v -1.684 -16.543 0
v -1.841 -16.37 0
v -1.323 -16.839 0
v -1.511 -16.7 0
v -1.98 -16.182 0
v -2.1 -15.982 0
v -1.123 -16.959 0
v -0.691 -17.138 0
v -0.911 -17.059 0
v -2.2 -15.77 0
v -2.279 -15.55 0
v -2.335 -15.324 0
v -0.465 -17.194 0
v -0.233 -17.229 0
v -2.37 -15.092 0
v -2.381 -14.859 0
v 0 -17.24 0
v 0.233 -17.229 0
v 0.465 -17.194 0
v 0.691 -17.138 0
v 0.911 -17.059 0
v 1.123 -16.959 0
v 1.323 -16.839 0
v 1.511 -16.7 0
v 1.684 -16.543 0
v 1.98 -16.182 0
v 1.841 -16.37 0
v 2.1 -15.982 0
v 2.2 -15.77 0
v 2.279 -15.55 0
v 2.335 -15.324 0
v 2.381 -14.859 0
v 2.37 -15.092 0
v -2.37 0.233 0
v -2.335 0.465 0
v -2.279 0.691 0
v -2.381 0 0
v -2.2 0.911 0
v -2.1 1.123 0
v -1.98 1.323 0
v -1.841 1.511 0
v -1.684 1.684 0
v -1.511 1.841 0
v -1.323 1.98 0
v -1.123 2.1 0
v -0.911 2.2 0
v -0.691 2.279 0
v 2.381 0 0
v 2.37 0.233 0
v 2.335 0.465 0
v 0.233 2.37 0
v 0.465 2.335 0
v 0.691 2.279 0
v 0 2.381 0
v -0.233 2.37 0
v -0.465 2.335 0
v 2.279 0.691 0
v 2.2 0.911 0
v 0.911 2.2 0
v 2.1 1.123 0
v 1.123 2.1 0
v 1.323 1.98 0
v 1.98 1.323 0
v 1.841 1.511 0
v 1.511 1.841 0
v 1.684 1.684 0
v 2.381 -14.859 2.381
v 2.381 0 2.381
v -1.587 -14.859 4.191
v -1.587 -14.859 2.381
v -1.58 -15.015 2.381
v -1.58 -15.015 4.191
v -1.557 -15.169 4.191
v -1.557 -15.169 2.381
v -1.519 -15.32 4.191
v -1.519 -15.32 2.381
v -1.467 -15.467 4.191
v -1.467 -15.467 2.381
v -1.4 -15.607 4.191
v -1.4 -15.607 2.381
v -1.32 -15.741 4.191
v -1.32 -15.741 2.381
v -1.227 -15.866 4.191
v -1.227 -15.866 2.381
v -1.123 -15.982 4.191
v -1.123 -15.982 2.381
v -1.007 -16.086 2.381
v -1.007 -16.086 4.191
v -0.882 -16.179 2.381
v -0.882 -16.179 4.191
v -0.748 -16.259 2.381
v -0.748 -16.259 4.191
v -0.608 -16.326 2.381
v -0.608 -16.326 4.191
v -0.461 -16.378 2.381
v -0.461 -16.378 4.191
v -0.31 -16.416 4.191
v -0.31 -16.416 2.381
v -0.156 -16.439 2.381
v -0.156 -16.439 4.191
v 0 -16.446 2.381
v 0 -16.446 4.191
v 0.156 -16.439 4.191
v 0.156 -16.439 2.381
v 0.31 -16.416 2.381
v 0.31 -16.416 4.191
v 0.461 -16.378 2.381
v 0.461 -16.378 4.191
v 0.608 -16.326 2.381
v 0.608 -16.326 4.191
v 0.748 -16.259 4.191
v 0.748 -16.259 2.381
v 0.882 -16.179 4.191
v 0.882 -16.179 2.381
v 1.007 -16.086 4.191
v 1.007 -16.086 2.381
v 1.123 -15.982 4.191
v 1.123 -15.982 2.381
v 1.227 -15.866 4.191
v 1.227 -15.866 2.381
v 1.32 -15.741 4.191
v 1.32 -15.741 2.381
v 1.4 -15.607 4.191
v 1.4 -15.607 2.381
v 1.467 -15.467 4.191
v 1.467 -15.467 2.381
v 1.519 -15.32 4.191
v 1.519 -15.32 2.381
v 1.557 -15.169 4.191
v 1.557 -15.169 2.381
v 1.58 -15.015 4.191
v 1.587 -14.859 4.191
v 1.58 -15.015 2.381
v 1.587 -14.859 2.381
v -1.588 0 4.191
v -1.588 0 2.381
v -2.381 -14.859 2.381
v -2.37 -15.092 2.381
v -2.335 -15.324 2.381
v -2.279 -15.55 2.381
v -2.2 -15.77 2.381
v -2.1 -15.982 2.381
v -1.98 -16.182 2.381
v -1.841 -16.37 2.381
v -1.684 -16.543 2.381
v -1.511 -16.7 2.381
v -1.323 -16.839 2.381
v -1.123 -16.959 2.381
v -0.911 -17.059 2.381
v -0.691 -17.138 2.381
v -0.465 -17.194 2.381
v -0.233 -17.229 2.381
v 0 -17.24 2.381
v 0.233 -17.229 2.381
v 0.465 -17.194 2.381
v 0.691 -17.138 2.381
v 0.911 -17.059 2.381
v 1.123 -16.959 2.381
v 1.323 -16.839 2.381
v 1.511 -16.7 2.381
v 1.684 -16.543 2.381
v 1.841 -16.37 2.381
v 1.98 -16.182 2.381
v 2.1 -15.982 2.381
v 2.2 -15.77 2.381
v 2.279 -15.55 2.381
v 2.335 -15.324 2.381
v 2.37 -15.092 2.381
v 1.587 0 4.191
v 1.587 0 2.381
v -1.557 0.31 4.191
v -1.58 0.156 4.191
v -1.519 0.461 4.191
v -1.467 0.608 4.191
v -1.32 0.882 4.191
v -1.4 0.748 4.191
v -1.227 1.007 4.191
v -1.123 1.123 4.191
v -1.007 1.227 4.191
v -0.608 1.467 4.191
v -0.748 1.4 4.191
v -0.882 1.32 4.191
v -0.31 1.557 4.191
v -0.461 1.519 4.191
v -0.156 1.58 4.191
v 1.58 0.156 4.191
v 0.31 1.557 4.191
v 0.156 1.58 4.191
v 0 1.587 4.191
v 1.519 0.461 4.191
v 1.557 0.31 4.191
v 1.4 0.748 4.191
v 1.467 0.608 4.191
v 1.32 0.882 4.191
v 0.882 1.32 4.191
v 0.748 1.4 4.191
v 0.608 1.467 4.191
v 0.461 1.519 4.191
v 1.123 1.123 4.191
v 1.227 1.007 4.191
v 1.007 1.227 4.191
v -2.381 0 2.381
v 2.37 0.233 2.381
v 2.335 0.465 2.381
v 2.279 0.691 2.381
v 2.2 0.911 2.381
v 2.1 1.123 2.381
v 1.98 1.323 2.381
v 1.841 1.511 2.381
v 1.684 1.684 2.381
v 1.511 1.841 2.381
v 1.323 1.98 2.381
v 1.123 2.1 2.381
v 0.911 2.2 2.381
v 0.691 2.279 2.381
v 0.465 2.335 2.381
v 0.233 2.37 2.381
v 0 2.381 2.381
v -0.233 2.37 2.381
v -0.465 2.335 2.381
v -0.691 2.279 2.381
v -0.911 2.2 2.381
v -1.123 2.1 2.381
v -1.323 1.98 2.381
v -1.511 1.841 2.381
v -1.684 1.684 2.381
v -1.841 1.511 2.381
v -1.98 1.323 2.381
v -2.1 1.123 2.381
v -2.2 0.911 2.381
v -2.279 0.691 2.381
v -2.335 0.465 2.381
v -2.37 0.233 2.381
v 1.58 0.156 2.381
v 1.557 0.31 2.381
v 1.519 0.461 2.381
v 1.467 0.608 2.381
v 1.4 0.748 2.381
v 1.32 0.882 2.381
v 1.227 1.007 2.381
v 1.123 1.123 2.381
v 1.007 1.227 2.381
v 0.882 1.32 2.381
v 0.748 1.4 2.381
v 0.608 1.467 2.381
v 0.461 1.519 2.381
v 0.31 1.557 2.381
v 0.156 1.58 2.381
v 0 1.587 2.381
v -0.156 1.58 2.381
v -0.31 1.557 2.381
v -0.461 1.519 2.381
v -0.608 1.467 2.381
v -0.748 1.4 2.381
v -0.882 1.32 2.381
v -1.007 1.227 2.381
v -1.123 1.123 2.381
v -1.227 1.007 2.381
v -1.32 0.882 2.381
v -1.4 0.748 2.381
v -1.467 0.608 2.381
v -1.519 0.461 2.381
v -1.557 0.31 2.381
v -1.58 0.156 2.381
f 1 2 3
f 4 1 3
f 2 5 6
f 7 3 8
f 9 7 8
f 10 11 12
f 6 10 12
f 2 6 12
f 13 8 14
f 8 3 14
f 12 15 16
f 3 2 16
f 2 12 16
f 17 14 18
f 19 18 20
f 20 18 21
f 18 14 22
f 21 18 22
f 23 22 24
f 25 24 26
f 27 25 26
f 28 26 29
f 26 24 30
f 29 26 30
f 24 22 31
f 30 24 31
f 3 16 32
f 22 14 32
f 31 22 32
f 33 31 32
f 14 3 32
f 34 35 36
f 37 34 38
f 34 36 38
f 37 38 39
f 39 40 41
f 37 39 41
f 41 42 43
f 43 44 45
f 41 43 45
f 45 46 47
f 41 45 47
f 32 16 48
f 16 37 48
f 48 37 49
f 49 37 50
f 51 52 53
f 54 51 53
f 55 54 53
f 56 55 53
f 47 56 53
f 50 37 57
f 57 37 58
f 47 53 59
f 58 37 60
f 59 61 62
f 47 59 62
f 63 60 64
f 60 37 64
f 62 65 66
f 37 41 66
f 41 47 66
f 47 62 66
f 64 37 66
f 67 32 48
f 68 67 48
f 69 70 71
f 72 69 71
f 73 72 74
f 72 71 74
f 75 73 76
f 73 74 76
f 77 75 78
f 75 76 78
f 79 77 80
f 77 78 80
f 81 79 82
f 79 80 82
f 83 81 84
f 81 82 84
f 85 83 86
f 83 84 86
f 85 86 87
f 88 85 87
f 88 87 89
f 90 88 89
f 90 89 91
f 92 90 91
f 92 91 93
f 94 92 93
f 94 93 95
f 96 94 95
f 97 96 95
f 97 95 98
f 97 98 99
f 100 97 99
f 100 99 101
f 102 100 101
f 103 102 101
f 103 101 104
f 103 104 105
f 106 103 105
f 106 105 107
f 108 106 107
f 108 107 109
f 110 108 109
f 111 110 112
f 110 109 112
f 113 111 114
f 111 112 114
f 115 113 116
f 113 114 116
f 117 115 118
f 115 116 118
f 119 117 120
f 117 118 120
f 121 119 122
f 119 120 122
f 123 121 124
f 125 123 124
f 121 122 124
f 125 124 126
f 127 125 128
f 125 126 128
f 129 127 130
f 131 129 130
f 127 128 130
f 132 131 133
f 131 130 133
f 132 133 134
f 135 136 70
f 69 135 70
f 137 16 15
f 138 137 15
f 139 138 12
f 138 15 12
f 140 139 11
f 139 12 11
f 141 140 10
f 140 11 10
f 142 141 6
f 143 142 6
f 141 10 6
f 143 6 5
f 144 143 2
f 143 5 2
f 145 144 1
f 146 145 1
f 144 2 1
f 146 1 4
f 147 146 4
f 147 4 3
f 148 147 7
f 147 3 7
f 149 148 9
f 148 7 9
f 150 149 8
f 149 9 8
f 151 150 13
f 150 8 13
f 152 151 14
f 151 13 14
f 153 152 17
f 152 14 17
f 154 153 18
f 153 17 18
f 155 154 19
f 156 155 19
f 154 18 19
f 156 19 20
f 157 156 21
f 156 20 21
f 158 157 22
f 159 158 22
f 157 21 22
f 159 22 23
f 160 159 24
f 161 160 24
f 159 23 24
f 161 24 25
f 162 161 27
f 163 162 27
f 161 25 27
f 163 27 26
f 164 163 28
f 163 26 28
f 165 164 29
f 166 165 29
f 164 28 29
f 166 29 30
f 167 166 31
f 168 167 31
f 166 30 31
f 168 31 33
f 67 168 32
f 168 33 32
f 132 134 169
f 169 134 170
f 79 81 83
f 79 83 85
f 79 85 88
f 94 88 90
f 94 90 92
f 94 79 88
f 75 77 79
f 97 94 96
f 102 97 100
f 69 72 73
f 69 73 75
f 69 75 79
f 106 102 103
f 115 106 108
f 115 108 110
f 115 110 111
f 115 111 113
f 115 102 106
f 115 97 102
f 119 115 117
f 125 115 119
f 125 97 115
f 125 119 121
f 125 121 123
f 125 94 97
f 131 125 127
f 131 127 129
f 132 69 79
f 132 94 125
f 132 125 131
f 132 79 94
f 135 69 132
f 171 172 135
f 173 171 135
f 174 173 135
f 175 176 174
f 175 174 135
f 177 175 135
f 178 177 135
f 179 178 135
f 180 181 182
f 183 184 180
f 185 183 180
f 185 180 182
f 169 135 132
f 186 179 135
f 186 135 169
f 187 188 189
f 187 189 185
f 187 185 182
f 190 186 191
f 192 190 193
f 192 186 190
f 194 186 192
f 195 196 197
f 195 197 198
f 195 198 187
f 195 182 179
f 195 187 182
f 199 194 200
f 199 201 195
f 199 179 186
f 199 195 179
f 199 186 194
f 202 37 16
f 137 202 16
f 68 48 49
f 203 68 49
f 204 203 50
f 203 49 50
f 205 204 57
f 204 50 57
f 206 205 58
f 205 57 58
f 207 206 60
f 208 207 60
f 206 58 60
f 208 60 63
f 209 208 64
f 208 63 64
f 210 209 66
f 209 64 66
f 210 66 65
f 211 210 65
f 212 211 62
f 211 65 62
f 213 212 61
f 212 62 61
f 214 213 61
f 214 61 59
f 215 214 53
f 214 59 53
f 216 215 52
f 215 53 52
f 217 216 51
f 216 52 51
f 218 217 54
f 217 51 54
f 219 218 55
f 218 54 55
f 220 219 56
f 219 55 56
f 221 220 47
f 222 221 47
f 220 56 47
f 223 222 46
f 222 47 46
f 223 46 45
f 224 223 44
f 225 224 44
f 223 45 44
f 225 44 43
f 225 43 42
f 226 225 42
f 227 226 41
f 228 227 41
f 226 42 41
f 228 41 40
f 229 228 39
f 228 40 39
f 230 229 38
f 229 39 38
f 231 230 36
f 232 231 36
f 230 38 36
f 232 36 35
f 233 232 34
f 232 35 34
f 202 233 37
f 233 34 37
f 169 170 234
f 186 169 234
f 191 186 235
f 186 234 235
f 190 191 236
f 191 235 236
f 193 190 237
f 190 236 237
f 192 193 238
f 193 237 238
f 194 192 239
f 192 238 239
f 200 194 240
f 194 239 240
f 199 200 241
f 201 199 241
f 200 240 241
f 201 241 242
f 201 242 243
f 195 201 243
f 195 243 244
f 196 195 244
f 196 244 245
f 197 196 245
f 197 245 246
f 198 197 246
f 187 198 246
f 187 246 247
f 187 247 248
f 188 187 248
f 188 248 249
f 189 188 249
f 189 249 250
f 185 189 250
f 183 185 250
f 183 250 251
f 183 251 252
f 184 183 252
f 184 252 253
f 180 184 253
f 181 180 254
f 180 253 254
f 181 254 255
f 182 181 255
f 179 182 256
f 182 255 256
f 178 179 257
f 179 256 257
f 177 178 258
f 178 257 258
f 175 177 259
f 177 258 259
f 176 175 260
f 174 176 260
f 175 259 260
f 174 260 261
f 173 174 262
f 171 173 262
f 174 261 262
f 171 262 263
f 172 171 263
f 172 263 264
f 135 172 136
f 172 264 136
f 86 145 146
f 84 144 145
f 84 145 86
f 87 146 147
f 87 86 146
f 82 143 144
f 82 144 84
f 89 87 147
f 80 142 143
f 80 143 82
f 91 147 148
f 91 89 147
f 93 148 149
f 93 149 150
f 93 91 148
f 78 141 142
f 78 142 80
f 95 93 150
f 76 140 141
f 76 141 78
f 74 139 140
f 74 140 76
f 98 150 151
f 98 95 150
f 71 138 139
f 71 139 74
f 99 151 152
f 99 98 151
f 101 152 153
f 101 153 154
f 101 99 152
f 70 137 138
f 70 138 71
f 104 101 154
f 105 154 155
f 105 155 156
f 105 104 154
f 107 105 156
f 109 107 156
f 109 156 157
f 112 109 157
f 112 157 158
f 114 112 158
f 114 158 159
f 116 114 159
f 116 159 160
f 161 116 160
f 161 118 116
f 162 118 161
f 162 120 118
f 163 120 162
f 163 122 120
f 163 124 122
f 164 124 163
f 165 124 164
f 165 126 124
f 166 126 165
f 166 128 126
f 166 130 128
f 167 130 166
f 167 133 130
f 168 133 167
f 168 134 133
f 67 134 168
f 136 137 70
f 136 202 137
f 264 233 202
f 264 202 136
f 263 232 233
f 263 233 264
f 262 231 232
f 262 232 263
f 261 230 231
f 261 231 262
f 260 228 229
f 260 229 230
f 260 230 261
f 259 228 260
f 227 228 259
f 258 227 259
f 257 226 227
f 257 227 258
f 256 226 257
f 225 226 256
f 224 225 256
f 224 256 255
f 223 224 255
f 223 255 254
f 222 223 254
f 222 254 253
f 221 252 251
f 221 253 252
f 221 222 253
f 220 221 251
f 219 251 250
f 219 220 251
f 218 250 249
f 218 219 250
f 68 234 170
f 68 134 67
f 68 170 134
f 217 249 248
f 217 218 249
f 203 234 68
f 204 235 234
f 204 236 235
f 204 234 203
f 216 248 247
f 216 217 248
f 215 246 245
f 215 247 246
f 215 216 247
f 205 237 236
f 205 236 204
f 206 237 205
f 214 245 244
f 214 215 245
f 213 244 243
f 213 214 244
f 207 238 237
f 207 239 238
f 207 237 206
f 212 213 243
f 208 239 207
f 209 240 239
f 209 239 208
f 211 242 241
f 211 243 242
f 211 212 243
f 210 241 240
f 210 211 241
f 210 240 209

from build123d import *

# Parameters (mm, degrees)
BOSS_EXTRUDE1_DEPTH = 2.38125
BOSS_EXTRUDE2_DEPTH = 4.191


with BuildPart() as part:
    # Sketch1 → Boss-Extrude1 (new body)
    with BuildSketch(Plane.XY):
        with BuildLine():
            Line((2.38125, -14.859), (2.38125, 0))
            ThreePointArc((2.38125, 0), (0, 2.38125), (-2.38125, 0))
            Line((-2.38125, 0), (-2.38125, -14.859))
            ThreePointArc((-2.38125, -14.859), (0, -17.24025), (2.38125, -14.859))
        make_face()
        with BuildLine():
            Line((1.5875, -14.859), (1.5875, 0))
            ThreePointArc((1.5875, 0), (0, 1.5875), (-1.5875, 0))
            Line((-1.5875, 0), (-1.5875, -14.859))
            ThreePointArc((-1.5875, -14.859), (0, -16.4465), (1.5875, -14.859))
        make_face(mode=Mode.SUBTRACT)
    extrude(amount=BOSS_EXTRUDE1_DEPTH)

    # Sketch1<5> → Boss-Extrude2 (add)
    with BuildSketch(Plane.XY):
        with BuildLine():
            Line((1.5875, -14.859), (1.5875, 0))
            ThreePointArc((1.5875, 0), (0, 1.5875), (-1.5875, 0))
            Line((-1.5875, 0), (-1.5875, -14.859))
            ThreePointArc((-1.5875, -14.859), (0, -16.4465), (1.5875, -14.859))
        make_face()
    extrude(amount=BOSS_EXTRUDE2_DEPTH)


solid = part.part
